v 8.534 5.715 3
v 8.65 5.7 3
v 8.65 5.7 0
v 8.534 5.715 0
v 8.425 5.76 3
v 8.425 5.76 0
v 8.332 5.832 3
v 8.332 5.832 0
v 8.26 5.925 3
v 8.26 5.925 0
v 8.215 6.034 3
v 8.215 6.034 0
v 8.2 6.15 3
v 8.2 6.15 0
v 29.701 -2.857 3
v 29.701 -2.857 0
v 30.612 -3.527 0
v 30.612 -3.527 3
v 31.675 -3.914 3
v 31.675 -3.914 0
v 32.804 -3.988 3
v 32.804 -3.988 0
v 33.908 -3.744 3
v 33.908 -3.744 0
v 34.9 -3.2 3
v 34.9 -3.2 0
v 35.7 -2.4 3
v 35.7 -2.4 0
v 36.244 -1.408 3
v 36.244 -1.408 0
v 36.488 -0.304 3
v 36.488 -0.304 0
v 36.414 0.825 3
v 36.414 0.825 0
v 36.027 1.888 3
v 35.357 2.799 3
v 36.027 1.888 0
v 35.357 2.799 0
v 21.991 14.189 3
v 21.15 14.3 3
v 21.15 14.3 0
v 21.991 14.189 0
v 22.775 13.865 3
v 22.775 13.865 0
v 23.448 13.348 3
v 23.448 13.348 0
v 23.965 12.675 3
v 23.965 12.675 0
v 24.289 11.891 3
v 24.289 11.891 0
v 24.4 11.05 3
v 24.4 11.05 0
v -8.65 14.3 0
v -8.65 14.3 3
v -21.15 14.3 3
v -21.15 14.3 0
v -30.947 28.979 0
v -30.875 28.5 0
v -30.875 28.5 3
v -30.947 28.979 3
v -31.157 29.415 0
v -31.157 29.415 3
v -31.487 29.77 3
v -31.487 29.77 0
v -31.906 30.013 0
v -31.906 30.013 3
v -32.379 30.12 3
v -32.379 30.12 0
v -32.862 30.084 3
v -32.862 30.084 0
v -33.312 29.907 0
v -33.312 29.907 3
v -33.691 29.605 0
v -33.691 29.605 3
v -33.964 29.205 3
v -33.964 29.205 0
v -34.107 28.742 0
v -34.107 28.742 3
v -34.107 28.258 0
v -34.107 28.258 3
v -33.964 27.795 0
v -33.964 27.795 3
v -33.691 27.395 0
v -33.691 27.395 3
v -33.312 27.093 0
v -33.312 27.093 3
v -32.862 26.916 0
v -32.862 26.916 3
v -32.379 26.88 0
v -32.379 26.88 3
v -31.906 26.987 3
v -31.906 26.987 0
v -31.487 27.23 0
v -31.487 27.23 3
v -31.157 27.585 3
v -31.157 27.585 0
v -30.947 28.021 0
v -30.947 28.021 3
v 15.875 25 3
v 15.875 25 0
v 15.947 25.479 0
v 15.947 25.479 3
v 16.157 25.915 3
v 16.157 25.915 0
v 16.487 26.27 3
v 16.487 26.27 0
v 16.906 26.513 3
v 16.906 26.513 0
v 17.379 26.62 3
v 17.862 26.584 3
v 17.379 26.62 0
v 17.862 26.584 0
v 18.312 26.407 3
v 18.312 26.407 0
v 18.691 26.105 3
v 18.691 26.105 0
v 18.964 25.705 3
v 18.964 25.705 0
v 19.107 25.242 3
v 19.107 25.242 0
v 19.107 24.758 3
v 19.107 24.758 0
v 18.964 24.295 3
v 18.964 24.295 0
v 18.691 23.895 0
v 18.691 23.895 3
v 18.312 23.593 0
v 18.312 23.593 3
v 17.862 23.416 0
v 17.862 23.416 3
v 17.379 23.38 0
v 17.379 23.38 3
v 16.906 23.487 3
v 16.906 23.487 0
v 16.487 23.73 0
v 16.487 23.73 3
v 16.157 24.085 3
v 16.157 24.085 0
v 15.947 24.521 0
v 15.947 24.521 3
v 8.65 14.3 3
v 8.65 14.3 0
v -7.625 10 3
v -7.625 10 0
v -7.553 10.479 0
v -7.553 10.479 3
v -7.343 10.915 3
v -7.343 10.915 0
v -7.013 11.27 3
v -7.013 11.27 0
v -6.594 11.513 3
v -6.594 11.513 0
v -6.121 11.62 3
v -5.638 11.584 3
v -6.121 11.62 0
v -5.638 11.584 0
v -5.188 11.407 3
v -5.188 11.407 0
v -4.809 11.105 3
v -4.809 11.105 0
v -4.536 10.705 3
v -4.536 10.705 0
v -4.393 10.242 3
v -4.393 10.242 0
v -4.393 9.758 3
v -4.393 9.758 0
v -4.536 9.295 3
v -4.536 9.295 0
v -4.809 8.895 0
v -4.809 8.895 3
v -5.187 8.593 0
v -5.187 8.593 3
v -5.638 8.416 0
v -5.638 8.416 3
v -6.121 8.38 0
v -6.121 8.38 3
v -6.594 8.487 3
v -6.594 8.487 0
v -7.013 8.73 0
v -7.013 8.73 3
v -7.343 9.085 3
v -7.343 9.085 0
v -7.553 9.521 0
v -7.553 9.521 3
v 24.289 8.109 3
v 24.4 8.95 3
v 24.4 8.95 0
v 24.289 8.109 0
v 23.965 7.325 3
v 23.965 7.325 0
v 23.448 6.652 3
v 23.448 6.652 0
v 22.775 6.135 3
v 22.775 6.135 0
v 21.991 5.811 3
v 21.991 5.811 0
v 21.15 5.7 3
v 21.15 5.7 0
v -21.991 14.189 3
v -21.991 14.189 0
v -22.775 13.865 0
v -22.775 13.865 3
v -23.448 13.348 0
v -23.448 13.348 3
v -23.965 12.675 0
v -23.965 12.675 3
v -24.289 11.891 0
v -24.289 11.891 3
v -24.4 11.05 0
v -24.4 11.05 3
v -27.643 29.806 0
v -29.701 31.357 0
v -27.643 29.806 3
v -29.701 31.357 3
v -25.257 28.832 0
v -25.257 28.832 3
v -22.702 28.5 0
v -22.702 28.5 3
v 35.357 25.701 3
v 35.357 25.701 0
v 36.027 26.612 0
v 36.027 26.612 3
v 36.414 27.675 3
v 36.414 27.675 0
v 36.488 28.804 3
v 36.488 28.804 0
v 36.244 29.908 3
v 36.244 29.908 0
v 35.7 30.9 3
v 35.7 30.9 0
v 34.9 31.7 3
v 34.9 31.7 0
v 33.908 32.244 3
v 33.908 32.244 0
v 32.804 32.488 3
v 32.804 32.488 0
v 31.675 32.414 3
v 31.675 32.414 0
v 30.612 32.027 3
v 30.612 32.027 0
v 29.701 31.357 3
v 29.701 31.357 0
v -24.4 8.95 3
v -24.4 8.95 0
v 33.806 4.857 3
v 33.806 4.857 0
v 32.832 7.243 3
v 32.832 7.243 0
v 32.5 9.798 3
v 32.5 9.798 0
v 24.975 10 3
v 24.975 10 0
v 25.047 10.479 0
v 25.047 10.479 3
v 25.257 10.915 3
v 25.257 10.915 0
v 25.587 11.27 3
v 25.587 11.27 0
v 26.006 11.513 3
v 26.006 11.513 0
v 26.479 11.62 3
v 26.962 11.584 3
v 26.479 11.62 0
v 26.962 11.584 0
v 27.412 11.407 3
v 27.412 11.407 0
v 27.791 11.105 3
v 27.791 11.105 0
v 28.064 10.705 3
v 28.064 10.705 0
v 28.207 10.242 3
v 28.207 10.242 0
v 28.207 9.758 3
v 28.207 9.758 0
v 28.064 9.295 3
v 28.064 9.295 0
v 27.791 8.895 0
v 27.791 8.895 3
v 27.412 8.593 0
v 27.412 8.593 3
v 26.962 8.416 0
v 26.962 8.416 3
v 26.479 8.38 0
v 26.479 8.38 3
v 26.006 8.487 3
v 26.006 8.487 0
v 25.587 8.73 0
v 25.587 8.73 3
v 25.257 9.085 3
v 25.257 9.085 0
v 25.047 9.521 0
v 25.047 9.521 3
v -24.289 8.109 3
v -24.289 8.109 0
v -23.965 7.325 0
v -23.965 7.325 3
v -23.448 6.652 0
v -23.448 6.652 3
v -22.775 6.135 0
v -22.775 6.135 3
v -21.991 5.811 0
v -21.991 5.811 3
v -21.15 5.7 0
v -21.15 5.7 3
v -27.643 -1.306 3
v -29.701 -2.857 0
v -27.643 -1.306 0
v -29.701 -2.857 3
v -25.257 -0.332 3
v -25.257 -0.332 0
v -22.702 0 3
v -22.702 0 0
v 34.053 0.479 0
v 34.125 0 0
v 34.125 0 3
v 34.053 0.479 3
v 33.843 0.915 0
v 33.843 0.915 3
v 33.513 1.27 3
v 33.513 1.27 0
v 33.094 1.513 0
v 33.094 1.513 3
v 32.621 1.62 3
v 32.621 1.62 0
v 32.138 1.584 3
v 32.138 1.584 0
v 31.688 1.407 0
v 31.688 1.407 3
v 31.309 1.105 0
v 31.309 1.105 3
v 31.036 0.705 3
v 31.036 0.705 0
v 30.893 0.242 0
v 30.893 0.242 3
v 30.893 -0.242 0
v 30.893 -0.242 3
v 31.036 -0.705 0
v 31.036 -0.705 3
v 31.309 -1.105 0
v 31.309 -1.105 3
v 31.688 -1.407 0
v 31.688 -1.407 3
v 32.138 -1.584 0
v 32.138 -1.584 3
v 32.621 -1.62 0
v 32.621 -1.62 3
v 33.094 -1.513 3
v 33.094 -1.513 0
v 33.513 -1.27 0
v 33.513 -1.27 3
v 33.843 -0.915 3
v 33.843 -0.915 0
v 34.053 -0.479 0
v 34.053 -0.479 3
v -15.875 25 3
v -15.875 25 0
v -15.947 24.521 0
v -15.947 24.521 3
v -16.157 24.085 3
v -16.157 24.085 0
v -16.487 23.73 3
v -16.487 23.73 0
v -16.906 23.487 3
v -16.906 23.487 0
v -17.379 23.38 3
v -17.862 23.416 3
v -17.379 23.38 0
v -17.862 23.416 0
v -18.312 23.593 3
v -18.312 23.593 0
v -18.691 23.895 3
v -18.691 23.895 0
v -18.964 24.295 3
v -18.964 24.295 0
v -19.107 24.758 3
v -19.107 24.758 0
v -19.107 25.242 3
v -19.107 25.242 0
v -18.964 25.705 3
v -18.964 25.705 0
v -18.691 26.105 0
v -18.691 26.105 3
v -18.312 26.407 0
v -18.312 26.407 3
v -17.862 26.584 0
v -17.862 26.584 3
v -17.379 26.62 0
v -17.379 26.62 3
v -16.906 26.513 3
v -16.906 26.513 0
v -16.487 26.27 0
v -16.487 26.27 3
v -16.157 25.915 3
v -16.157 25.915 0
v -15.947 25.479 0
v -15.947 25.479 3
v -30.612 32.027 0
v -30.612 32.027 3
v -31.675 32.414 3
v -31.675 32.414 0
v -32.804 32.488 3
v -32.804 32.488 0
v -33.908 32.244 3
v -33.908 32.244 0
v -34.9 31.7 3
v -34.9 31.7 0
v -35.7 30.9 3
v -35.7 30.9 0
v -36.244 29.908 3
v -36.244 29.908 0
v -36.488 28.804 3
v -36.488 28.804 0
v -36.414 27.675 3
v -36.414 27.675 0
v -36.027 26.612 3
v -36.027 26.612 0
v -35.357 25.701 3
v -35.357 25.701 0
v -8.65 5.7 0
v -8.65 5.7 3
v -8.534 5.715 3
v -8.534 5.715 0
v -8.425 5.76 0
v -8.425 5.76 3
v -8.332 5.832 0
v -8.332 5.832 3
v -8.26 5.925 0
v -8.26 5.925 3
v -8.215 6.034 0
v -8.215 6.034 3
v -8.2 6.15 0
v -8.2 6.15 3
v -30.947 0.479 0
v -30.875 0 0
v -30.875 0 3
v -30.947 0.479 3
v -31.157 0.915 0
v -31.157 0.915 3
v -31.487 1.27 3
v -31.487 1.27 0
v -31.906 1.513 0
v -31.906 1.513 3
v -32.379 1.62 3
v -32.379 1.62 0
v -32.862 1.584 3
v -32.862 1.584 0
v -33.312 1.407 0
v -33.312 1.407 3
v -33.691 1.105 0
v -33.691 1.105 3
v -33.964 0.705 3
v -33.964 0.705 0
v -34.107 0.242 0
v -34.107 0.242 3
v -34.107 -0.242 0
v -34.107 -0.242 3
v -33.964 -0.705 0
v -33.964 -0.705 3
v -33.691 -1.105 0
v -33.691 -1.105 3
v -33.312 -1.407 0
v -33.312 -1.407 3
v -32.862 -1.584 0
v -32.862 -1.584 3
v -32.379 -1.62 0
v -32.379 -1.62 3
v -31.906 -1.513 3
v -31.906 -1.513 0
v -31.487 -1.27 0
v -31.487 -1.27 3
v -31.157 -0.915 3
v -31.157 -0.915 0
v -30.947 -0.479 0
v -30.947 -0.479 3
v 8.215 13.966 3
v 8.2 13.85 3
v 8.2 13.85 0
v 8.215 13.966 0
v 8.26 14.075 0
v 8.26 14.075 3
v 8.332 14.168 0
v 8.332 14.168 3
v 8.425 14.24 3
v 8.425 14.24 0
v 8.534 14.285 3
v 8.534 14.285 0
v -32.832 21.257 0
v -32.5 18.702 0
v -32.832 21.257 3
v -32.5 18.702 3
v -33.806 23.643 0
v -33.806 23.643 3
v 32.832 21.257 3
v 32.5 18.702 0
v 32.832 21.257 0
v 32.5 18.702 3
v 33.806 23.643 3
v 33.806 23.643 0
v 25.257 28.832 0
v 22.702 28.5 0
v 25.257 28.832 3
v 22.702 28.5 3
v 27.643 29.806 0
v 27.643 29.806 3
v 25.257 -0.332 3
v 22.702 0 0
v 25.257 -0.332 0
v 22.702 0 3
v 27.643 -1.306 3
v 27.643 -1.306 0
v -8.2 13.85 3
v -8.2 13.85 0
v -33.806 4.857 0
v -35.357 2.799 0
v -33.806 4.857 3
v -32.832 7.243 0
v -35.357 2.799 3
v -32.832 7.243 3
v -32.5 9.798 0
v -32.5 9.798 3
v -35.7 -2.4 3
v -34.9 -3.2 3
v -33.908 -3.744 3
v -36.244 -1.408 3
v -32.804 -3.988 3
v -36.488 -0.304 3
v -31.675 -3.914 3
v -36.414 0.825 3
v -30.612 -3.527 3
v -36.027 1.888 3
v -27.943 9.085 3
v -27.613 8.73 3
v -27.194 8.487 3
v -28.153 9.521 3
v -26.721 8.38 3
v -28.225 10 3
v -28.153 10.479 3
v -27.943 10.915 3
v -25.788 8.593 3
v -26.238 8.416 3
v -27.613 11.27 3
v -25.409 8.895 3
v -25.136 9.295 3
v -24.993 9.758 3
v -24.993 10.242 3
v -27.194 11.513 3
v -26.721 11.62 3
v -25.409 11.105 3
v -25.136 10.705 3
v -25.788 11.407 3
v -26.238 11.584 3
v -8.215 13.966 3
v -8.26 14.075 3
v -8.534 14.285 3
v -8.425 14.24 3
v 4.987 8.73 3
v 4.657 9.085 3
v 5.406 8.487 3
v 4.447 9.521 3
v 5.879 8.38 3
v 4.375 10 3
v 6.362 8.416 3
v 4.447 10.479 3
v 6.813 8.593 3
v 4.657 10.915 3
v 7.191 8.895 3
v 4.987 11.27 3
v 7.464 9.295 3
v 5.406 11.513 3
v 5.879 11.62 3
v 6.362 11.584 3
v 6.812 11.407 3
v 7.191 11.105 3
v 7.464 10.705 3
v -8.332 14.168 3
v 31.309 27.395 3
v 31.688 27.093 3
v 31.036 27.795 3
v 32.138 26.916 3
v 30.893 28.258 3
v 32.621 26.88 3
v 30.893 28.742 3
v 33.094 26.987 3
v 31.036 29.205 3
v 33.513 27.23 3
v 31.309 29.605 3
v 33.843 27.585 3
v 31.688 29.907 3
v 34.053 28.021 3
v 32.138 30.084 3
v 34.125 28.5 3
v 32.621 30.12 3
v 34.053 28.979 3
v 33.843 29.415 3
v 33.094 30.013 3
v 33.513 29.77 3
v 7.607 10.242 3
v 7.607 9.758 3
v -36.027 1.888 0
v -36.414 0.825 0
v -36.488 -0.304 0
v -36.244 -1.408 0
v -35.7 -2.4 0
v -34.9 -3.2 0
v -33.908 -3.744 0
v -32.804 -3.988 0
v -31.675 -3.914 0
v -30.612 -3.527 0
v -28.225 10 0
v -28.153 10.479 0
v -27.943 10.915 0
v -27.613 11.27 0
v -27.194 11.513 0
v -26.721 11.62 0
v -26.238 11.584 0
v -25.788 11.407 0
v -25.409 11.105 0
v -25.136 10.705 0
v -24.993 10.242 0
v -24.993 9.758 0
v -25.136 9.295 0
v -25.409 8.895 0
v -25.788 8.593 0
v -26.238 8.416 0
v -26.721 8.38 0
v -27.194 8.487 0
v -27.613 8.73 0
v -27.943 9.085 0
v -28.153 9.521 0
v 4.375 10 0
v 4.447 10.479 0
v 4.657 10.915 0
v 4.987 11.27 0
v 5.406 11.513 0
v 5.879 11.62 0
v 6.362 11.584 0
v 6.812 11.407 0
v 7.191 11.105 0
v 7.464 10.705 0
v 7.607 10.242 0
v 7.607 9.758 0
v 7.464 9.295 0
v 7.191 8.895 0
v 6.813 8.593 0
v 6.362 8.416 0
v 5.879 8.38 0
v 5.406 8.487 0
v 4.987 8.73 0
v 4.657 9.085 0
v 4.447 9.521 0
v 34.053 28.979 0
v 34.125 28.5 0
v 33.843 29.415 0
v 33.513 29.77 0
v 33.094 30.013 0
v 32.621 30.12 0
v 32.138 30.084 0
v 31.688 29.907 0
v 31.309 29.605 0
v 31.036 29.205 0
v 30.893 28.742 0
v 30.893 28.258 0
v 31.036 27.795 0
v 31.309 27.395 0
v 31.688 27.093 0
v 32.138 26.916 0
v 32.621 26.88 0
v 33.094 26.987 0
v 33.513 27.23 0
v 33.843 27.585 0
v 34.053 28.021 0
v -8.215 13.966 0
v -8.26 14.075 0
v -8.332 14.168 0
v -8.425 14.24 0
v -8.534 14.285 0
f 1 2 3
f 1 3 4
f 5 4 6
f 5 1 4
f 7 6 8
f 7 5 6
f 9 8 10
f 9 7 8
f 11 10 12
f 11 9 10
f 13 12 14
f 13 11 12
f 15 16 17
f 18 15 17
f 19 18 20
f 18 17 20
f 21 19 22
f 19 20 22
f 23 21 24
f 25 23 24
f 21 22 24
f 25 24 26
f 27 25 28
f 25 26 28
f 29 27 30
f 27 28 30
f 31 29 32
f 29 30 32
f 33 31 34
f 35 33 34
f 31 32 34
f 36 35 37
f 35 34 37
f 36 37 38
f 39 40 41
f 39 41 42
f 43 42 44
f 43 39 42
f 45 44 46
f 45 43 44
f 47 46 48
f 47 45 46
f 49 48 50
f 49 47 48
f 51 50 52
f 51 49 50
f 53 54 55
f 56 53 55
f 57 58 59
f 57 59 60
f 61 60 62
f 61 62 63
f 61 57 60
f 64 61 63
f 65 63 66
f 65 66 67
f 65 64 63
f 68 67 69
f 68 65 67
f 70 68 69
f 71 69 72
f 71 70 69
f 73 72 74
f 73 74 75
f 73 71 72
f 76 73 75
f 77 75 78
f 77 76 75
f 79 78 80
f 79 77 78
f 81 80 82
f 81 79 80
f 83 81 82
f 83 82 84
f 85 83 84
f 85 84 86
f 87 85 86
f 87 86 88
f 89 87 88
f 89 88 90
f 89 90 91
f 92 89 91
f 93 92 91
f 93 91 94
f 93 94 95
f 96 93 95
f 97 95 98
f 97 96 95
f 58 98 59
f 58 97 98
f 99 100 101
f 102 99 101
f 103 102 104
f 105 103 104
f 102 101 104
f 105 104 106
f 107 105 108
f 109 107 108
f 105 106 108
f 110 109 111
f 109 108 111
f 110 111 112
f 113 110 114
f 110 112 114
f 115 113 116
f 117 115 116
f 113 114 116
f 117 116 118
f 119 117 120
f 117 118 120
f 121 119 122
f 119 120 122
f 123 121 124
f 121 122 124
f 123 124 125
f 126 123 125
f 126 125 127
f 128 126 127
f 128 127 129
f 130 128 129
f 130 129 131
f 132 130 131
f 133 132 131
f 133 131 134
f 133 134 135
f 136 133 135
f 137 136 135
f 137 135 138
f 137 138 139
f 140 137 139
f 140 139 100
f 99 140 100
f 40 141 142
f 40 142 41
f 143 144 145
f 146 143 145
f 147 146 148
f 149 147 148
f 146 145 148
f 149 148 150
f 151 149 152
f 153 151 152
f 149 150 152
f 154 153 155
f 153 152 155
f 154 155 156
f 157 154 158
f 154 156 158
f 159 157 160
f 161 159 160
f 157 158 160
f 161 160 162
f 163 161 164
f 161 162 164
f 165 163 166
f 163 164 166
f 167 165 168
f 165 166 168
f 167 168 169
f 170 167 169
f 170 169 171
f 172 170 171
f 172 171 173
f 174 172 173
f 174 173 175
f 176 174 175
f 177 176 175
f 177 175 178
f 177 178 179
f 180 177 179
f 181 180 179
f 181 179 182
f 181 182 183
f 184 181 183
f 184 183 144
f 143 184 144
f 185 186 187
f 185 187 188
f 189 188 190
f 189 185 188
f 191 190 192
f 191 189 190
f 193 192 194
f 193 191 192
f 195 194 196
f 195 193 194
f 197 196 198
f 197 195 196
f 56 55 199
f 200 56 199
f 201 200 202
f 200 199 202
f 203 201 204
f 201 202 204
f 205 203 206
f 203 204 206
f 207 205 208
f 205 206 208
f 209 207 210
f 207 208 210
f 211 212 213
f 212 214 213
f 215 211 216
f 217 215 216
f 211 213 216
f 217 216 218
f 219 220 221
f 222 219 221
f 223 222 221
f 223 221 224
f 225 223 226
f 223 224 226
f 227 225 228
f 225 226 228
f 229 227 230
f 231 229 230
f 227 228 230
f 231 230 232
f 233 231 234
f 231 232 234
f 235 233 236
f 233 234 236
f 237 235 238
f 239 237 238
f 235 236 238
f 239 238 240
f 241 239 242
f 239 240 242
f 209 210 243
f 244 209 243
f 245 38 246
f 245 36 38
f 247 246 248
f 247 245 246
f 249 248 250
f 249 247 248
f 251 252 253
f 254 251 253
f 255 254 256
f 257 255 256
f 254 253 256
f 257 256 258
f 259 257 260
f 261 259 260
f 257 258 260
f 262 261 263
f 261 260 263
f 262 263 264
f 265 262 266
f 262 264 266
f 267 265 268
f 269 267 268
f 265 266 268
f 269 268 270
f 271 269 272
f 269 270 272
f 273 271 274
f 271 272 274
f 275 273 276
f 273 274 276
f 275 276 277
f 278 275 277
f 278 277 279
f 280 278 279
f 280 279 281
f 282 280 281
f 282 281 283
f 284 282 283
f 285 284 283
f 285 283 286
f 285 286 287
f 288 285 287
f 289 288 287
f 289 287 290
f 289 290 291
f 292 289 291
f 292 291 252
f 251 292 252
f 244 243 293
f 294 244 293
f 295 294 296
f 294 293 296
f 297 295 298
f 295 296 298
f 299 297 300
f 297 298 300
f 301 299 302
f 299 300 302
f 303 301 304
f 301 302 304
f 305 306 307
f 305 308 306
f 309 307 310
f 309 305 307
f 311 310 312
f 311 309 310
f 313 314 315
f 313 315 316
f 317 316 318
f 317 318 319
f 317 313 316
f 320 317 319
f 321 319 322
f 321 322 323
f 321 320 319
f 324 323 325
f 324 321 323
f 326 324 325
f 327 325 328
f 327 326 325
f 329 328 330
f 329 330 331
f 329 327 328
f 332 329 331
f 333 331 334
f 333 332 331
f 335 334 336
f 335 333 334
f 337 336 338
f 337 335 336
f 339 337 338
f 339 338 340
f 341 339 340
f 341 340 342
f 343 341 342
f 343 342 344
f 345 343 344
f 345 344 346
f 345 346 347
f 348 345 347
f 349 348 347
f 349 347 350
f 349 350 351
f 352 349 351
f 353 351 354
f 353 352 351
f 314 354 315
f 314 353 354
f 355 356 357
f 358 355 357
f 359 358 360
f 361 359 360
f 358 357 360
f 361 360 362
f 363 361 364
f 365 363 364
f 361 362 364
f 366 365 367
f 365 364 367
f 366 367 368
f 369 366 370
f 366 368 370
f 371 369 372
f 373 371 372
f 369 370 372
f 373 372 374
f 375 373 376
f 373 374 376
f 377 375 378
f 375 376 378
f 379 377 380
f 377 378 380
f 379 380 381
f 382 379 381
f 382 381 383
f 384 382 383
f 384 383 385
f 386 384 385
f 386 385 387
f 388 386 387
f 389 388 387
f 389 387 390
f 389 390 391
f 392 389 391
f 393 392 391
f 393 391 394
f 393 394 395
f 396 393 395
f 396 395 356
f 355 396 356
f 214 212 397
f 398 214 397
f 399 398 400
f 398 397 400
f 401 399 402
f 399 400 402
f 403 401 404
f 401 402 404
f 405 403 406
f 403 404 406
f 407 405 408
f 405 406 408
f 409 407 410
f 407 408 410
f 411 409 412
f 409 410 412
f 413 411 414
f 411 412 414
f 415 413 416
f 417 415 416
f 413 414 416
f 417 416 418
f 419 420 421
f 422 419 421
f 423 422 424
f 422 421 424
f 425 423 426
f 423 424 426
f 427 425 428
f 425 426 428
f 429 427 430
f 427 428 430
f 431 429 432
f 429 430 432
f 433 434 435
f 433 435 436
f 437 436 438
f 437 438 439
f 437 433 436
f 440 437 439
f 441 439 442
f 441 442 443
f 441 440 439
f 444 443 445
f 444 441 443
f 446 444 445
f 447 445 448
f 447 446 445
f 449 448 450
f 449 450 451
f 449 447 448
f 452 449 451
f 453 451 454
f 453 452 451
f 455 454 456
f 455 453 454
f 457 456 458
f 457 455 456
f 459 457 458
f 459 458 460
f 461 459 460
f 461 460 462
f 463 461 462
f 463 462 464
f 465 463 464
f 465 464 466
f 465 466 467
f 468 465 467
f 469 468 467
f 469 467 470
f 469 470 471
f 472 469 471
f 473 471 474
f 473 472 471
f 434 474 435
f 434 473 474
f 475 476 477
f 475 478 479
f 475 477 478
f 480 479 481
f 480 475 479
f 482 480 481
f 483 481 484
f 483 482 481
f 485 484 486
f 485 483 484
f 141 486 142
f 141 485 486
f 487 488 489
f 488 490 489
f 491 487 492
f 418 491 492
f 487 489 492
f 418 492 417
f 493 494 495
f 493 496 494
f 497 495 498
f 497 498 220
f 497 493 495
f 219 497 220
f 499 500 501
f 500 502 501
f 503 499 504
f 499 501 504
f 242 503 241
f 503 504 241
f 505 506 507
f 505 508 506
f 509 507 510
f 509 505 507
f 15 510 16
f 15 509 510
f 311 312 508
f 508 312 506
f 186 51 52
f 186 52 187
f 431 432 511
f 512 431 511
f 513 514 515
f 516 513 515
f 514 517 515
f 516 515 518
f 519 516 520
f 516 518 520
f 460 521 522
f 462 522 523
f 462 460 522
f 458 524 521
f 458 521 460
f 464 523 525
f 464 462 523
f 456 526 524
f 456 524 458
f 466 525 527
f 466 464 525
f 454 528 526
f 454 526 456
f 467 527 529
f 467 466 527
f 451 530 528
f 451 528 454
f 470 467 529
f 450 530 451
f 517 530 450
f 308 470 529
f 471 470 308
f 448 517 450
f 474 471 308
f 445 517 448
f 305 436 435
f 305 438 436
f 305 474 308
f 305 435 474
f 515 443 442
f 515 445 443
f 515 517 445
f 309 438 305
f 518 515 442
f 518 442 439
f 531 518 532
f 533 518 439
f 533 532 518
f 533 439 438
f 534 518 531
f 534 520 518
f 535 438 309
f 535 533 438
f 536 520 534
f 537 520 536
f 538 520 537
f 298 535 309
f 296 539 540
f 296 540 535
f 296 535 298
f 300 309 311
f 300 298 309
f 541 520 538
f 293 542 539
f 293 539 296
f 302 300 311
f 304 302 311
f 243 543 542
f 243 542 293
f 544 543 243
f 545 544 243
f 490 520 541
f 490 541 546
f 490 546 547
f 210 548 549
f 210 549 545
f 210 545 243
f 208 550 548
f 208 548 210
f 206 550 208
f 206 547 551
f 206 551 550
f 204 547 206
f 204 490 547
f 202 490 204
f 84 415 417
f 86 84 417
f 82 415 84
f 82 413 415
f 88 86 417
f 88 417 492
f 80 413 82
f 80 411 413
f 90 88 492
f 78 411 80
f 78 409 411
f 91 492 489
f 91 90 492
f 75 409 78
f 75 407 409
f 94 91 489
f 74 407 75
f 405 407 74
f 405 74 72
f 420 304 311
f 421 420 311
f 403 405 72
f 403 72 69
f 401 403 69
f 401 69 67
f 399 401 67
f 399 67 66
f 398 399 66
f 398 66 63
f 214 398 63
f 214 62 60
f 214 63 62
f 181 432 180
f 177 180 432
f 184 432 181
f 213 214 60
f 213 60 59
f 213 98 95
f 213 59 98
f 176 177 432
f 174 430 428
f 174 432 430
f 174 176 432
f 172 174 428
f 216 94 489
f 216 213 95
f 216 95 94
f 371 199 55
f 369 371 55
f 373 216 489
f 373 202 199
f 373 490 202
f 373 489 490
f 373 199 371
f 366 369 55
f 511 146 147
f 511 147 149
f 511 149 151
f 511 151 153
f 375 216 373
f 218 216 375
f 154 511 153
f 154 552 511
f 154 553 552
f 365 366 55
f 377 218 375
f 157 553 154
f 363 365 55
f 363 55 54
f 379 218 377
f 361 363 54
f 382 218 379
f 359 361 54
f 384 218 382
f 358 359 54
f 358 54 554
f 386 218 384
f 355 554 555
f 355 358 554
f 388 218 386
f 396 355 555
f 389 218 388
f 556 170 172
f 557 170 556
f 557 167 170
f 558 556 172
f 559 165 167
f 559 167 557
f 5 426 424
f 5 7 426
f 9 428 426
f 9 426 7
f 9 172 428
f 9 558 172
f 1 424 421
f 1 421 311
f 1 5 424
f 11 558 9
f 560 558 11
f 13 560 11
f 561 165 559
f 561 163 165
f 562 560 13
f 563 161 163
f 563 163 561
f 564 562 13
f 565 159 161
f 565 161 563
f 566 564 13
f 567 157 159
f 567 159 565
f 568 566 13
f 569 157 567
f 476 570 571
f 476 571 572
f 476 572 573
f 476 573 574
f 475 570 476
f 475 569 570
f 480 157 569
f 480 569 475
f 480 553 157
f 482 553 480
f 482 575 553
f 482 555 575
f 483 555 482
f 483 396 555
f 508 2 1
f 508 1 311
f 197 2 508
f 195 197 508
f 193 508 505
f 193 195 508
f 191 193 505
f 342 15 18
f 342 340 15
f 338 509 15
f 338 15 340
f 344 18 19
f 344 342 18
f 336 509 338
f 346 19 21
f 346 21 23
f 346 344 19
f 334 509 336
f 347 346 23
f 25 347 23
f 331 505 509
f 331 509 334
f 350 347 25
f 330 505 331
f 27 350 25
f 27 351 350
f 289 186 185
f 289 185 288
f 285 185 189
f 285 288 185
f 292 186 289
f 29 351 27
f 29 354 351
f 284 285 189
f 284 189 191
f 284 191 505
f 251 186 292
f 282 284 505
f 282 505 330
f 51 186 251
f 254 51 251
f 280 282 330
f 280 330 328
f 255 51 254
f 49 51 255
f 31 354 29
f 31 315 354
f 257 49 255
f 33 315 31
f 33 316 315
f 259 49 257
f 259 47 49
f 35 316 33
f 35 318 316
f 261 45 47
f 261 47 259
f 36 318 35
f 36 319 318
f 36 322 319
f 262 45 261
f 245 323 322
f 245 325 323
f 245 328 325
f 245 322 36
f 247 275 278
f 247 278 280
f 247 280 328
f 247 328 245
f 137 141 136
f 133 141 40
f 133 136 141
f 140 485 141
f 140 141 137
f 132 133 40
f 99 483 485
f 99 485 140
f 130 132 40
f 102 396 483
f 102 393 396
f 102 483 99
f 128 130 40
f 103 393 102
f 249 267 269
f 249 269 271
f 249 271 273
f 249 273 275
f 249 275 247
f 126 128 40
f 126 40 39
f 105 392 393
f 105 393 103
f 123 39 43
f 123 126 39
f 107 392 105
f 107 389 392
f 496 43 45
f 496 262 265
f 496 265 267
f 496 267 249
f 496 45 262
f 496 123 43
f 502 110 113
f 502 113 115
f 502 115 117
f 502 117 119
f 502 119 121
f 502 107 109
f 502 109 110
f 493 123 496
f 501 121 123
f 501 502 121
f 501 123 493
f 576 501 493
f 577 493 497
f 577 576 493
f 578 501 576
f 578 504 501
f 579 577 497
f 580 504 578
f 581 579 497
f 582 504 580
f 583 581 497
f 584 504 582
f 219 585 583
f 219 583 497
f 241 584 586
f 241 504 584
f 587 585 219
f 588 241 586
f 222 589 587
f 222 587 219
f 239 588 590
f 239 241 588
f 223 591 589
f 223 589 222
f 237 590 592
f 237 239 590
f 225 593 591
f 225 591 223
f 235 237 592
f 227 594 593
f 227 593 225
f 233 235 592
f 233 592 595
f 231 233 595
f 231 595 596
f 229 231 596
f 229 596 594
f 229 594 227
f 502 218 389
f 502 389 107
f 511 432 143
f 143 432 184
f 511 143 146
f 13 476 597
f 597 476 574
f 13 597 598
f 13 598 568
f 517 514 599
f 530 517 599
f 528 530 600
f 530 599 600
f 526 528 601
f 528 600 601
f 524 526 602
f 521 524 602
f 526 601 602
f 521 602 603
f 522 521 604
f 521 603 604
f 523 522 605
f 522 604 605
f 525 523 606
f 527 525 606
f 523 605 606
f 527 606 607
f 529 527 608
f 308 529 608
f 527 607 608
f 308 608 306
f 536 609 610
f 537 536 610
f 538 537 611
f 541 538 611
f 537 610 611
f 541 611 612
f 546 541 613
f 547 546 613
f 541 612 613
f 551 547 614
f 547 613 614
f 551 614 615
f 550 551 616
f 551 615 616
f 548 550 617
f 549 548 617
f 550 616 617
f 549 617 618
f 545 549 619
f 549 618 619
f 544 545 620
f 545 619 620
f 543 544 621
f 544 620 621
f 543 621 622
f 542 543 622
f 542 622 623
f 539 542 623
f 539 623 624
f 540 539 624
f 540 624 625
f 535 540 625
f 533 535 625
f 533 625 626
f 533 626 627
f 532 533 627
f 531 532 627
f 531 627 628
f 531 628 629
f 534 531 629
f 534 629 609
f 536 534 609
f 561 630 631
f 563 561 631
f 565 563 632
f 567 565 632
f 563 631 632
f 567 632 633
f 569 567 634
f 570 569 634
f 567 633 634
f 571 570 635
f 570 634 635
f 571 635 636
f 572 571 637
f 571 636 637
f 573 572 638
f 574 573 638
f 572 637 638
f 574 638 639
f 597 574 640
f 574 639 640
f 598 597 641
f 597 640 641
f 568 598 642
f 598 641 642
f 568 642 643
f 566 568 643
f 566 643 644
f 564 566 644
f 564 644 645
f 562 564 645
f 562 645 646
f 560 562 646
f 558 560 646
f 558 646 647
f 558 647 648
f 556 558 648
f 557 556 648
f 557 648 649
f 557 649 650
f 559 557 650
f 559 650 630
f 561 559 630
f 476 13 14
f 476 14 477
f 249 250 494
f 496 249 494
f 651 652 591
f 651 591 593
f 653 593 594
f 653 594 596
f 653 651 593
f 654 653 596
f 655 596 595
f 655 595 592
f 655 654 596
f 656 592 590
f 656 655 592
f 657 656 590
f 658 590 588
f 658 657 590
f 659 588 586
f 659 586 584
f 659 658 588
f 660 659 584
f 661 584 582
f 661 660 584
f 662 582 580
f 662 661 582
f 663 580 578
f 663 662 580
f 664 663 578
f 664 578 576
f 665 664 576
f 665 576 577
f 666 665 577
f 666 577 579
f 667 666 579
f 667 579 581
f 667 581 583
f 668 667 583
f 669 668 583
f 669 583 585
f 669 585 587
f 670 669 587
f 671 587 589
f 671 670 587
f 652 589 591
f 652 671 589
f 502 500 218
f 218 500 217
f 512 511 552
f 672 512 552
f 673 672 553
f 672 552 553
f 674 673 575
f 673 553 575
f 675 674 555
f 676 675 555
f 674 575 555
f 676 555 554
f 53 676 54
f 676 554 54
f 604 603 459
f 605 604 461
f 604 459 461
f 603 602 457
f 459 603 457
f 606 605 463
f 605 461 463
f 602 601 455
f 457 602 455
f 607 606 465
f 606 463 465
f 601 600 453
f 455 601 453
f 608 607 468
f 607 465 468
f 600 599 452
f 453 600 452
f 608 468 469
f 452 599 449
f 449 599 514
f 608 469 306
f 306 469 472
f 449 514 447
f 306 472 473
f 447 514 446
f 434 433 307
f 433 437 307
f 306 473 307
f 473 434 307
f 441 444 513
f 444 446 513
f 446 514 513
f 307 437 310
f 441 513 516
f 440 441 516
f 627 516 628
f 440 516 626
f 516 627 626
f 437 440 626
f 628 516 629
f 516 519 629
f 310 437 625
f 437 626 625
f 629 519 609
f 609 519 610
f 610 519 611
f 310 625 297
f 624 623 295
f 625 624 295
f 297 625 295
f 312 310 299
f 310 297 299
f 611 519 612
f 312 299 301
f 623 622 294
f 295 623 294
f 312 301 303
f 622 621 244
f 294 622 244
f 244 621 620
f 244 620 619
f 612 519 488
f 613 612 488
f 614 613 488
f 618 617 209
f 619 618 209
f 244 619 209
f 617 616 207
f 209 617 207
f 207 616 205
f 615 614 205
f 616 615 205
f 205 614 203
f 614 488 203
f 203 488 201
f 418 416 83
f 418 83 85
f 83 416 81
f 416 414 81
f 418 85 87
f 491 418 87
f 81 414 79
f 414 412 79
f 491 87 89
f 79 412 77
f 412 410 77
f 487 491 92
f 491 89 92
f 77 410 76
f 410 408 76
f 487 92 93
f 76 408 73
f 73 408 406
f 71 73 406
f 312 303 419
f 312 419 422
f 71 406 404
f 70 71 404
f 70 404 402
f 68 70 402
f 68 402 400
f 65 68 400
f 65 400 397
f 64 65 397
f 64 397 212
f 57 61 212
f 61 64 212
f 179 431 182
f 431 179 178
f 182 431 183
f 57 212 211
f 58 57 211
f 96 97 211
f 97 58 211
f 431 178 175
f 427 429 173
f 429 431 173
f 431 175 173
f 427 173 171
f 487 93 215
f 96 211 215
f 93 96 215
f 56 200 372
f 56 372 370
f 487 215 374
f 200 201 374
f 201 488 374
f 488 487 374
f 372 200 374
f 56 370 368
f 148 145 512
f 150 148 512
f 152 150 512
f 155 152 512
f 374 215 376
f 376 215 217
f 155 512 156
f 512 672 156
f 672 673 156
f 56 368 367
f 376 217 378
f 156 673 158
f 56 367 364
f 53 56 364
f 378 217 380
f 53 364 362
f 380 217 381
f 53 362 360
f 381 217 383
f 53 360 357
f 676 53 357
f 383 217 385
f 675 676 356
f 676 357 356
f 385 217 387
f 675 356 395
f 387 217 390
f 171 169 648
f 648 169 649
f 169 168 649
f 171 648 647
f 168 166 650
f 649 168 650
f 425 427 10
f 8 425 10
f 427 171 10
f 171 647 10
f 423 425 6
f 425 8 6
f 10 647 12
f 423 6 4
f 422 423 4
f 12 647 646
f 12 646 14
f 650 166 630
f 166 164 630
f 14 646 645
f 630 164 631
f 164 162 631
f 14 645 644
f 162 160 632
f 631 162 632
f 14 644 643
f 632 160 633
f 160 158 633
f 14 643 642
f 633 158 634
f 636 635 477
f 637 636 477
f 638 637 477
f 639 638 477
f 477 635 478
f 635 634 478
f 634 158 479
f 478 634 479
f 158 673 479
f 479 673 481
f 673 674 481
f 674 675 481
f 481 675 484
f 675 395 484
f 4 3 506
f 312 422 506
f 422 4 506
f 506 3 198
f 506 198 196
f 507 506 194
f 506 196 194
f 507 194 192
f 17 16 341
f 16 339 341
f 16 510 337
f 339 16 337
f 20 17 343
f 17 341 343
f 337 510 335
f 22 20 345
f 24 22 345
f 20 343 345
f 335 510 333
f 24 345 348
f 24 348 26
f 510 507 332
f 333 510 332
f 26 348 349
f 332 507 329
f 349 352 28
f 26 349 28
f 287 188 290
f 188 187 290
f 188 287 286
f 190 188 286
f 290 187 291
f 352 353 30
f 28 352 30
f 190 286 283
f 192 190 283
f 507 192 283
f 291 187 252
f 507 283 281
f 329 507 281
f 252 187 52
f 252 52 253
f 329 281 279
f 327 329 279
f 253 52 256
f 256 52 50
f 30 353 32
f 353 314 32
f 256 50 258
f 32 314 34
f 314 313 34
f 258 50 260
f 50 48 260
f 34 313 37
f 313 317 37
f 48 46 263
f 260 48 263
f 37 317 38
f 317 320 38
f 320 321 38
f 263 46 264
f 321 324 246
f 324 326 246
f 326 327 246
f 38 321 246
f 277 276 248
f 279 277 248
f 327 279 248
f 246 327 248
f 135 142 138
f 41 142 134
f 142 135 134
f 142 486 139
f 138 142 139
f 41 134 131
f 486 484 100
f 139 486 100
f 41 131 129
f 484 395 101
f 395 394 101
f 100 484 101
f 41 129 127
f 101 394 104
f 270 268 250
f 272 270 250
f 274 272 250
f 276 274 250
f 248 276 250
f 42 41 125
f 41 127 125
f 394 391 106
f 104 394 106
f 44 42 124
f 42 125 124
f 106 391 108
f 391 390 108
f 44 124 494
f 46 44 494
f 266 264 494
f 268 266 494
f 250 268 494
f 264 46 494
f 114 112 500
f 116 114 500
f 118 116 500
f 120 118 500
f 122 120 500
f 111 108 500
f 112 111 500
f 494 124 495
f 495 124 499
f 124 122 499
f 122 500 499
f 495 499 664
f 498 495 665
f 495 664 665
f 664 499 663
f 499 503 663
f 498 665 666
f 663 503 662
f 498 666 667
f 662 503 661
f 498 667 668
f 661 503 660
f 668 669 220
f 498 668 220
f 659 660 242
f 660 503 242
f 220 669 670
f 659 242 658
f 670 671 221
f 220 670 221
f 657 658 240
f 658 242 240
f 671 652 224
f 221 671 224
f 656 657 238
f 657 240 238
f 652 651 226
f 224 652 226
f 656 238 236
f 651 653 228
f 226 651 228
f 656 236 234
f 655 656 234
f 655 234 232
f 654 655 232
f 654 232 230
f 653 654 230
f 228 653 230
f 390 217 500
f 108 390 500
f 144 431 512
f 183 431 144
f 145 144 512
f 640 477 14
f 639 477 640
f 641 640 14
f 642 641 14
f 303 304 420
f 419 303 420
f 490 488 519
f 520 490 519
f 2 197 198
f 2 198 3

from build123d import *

# Parameters (mm, degrees)
SKETCH_1_R          = 1.625
EXTRUDE_1_DEPTH     = 3
FILLET_1_R          = 10
SKETCH_3_R          = 1.625
CUT_EXTRUDE_1_DEPTH = 10
CUT_EXTRUDE_2_DEPTH = 10
SKETCH_5_R          = 1.625
CUT_EXTRUDE_3_DEPTH = 10


with BuildPart() as part:
    # Эскиз1 → Бобышка-Вытянуть1 (new body)
    with BuildSketch(Plane.XY):
        with BuildLine():
            ThreePointArc((-32.5, 4), (-35.328427125, -2.828427125), (-28.5, 0))
            Line((-28.5, 0), (28.5, 0))
            ThreePointArc((28.5, 0), (35.328427125, -2.828427125), (32.5, 4))
            Line((32.5, 4), (32.5, 24.5))
            ThreePointArc((32.5, 24.5), (35.328427125, 31.328427125), (28.5, 28.5))
            Line((28.5, 28.5), (-28.5, 28.5))
            ThreePointArc((-28.5, 28.5), (-35.328427125, 31.328427125), (-32.5, 24.5))
            Line((-32.5, 24.5), (-32.5, 4))
        make_face()
        with Locations((-32.5, 0)):
            Circle(SKETCH_1_R, mode=Mode.SUBTRACT)
        with Locations((32.5, 28.5)):
            Circle(SKETCH_1_R, mode=Mode.SUBTRACT)
        with Locations((-32.5, 28.5)):
            Circle(SKETCH_1_R, mode=Mode.SUBTRACT)
        with Locations((32.5, 0)):
            Circle(SKETCH_1_R, mode=Mode.SUBTRACT)
    extrude(amount=EXTRUDE_1_DEPTH)

    # Скругление1
    fillet_1_edges = [part.edges().sort_by_distance(p)[0] for p in [
        (28.5, 0, 1.5),
        (-28.5, 0, 1.5),
        (-32.5, 4, 1.5),
        (-32.5, 24.5, 1.5),
        (-28.5, 28.5, 1.5),
        (28.5, 28.5, 1.5),
        (32.5, 24.5, 1.5),
        (32.5, 4, 1.5),
    ]]
    fillet(fillet_1_edges, radius=FILLET_1_R)

    # Эскиз3 → Вырез-Вытянуть1 (cut)
    with BuildSketch(Plane(origin=(0, 0, 0), x_dir=(-1, 0, 0), z_dir=(0, 0, -1))):
        with Locations((-17.5, 25)):
            Circle(SKETCH_3_R)
        with Locations(Location((17.5, 25, 0), (0, 0, 180))):
            Circle(SKETCH_3_R)
    extrude(amount=-CUT_EXTRUDE_1_DEPTH, mode=Mode.SUBTRACT)

    # Эскиз4 → Вырез-Вытянуть2 (cut)
    # profile 1 of 2: a face of its own
    with BuildSketch(Plane.XY.offset(3)):
        with BuildLine():
            Line((-8.2, 6.15), (-8.2, 13.85))
            ThreePointArc((-8.2, 13.85), (-8.331801948, 14.168198052), (-8.65, 14.3))
            Line((-8.65, 14.3), (-21.15, 14.3))
            ThreePointArc((-21.15, 14.3), (-23.448097039, 13.348097039), (-24.4, 11.05))
            Line((-24.4, 11.05), (-24.4, 8.95))
            ThreePointArc((-24.4, 8.95), (-23.448097039, 6.651902961), (-21.15, 5.7))
            Line((-21.15, 5.7), (-8.65, 5.7))
            ThreePointArc((-8.65, 5.7), (-8.331801948, 5.831801948), (-8.2, 6.15))
        make_face()
        with BuildLine():
            ThreePointArc((-21.15, 14.05), (-23.271320344, 13.171320344), (-24.15, 11.05))
            Line((-24.15, 11.05), (-24.15, 8.95))
            ThreePointArc((-24.15, 8.95), (-23.271320344, 6.828679656), (-21.15, 5.95))
            Line((-21.15, 5.95), (-8.65, 5.95))
            ThreePointArc((-8.65, 5.95), (-8.508578644, 6.008578644), (-8.45, 6.15))
            Line((-8.45, 6.15), (-8.45, 13.85))
            ThreePointArc((-8.45, 13.85), (-8.508578644, 13.991421356), (-8.65, 14.05))
            Line((-8.65, 14.05), (-21.15, 14.05))
        make_face(mode=Mode.SUBTRACT)
    # profile 2 of 2: a face of its own
    with BuildSketch(Plane.XY.offset(3)):
        with BuildLine():
            ThreePointArc((8.65, 5.7), (8.331801948, 5.831801948), (8.2, 6.15))
            Line((8.2, 6.15), (8.2, 13.85))
            ThreePointArc((8.2, 13.85), (8.331801948, 14.168198052), (8.65, 14.3))
            Line((8.65, 14.3), (21.15, 14.3))
            ThreePointArc((21.15, 14.3), (23.448097039, 13.348097039), (24.4, 11.05))
            Line((24.4, 11.05), (24.4, 8.95))
            ThreePointArc((24.4, 8.95), (23.448097039, 6.651902961), (21.15, 5.7))
            Line((21.15, 5.7), (8.65, 5.7))
        make_face()
        with BuildLine():
            Line((8.45, 6.15), (8.45, 13.85))
            ThreePointArc((8.45, 13.85), (8.508578644, 13.991421356), (8.65, 14.05))
            Line((8.65, 14.05), (21.15, 14.05))
            ThreePointArc((21.15, 14.05), (23.271320344, 13.171320344), (24.15, 11.05))
            Line((24.15, 11.05), (24.15, 8.95))
            ThreePointArc((24.15, 8.95), (23.271320344, 6.828679656), (21.15, 5.95))
            Line((21.15, 5.95), (8.65, 5.95))
            ThreePointArc((8.65, 5.95), (8.508578644, 6.008578644), (8.45, 6.15))
        make_face(mode=Mode.SUBTRACT)
    extrude(amount=-CUT_EXTRUDE_2_DEPTH, mode=Mode.SUBTRACT)


with BuildPart() as body_2:
    # of the pieces the cut leaves, the one that is kept (cut_extrude_2_keep)
    add(part.part.solids().sort_by_distance((-32.5, 18.702041029, 0))[0])

    # Эскиз5 → Вырез-Вытянуть3 (cut)
    with BuildSketch(Plane(origin=(0, 0, 0), x_dir=(-1, 0, 0), z_dir=(0, 0, -1))):
        with Locations((26.6, 10)):
            Circle(SKETCH_5_R)
        with Locations((-26.6, 10)):
            Circle(SKETCH_5_R)
        with Locations((-6, 10)):
            Circle(SKETCH_5_R)
        with Locations((6, 10)):
            Circle(SKETCH_5_R)
    extrude(amount=-CUT_EXTRUDE_3_DEPTH, mode=Mode.SUBTRACT)


solid = body_2.part
